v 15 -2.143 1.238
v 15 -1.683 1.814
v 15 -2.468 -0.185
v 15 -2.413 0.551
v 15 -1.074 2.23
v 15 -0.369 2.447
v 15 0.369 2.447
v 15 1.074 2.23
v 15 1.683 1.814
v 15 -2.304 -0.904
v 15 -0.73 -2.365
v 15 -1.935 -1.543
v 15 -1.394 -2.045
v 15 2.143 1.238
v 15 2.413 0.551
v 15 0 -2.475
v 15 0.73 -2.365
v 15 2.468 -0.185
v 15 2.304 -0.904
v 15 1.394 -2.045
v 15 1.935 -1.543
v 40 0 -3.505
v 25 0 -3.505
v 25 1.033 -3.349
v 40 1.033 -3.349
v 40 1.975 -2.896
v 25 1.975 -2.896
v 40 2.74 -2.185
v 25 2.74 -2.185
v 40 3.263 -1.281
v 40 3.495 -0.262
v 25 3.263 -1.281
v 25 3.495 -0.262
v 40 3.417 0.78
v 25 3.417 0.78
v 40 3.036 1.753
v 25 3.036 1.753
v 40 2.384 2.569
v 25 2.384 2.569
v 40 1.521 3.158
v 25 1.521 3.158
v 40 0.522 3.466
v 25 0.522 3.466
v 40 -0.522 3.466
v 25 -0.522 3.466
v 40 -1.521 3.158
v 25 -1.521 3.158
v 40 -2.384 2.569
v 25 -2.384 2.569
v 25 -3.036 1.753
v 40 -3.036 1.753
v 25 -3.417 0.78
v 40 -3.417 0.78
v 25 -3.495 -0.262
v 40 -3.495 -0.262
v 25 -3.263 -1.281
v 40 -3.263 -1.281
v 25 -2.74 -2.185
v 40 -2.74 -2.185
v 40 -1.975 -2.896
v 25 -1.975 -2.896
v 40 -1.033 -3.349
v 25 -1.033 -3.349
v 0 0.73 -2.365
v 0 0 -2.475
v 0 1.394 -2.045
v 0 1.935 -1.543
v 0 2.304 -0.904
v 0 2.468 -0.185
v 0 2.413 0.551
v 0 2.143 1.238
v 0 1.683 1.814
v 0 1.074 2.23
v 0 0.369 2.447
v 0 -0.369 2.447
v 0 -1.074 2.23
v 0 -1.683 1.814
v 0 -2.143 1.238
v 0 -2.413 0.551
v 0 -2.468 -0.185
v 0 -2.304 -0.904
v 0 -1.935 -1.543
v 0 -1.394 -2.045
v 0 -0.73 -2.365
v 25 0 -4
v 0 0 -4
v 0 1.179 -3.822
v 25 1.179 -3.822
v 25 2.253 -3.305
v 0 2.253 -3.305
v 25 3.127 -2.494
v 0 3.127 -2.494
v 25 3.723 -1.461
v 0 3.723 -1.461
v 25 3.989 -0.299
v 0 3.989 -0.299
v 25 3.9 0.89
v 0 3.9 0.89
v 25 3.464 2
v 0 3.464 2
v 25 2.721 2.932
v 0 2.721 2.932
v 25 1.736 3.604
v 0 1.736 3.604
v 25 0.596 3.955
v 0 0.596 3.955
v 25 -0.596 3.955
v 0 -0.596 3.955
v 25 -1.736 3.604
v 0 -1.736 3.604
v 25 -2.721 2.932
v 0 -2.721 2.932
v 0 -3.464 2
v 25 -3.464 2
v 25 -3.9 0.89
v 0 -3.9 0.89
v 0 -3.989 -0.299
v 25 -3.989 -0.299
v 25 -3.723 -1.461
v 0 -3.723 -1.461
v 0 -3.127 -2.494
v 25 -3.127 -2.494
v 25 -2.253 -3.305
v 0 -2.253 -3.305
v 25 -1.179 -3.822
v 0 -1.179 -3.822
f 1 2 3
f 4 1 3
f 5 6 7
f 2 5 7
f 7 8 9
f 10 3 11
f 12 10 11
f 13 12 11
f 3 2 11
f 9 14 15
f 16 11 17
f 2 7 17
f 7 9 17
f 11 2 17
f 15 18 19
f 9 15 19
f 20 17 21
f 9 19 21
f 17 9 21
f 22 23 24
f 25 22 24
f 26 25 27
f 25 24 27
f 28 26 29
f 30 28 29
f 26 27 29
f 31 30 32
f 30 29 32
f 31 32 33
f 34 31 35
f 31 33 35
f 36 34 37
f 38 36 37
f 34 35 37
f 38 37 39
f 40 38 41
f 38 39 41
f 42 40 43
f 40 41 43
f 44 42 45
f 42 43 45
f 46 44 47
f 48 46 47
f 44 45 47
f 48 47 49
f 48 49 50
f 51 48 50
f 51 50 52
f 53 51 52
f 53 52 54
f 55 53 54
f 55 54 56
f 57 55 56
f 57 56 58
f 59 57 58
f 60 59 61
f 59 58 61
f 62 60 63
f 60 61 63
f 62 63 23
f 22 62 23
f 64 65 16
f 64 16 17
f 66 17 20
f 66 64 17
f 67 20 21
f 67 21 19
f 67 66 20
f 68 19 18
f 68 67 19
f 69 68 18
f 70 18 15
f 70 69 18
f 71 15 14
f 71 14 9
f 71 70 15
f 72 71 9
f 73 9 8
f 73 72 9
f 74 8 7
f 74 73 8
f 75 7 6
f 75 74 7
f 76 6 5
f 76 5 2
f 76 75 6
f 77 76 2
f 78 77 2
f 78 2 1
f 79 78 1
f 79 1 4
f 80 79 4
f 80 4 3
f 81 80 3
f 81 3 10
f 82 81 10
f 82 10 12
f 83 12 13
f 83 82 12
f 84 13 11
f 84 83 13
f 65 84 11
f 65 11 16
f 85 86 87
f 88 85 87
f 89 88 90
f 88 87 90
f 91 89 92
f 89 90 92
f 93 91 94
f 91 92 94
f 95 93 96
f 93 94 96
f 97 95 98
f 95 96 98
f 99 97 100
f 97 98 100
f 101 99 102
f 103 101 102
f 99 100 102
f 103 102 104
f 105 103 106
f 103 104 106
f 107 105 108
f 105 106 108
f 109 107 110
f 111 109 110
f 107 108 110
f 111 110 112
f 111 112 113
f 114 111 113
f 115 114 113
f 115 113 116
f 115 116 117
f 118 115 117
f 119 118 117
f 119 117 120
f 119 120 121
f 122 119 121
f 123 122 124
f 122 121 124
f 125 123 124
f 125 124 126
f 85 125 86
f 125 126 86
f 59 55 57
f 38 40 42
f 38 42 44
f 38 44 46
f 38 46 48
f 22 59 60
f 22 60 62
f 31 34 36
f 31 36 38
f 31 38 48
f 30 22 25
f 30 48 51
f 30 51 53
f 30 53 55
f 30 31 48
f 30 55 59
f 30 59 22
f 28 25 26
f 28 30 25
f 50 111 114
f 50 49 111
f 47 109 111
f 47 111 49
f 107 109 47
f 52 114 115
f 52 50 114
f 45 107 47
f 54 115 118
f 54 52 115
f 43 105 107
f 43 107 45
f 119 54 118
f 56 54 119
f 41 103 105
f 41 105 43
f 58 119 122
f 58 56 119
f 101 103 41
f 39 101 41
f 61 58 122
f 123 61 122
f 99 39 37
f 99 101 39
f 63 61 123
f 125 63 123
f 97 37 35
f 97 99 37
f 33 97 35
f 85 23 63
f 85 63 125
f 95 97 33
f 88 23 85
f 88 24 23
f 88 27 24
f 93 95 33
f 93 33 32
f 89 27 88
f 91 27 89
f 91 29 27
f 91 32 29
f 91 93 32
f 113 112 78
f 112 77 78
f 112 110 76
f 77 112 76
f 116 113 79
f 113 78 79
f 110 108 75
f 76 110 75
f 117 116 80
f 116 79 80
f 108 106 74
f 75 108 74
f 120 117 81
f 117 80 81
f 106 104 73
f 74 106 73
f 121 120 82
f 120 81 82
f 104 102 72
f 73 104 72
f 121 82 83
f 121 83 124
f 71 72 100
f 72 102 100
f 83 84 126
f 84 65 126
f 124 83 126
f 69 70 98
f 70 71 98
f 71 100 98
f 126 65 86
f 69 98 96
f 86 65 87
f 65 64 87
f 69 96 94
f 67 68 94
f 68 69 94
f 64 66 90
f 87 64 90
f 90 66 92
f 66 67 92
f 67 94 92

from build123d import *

# Parameters (mm, degrees)
SKETCH1_R           = 4
BOSS_EXTRUDE1_DEPTH = 25
SKETCH2_R           = 2.475
CUT_EXTRUDE1_DEPTH  = 15
SKETCH4_R           = 3.5052
BOSS_EXTRUDE2_DEPTH = 15


with BuildPart() as part:
    # Sketch1 → Boss-Extrude1 (new body)
    with BuildSketch(Plane(origin=(0, 0, 0), x_dir=(0, 0, -1), z_dir=(1, 0, 0))):
        Circle(SKETCH1_R)
    extrude(amount=BOSS_EXTRUDE1_DEPTH)

    # Sketch2 → Cut-Extrude1 (cut)
    with BuildSketch(Plane(origin=(0, 0, 0), x_dir=(0, 0, -1), z_dir=(1, 0, 0))):
        Circle(SKETCH2_R)
    extrude(amount=CUT_EXTRUDE1_DEPTH, mode=Mode.SUBTRACT)

    # Sketch4 → Boss-Extrude2 (add)
    with BuildSketch(Plane(origin=(25, 0, 0), x_dir=(0, 0, -1), z_dir=(1, 0, 0))):
        Circle(SKETCH4_R)
    extrude(amount=BOSS_EXTRUDE2_DEPTH)


solid = part.part
